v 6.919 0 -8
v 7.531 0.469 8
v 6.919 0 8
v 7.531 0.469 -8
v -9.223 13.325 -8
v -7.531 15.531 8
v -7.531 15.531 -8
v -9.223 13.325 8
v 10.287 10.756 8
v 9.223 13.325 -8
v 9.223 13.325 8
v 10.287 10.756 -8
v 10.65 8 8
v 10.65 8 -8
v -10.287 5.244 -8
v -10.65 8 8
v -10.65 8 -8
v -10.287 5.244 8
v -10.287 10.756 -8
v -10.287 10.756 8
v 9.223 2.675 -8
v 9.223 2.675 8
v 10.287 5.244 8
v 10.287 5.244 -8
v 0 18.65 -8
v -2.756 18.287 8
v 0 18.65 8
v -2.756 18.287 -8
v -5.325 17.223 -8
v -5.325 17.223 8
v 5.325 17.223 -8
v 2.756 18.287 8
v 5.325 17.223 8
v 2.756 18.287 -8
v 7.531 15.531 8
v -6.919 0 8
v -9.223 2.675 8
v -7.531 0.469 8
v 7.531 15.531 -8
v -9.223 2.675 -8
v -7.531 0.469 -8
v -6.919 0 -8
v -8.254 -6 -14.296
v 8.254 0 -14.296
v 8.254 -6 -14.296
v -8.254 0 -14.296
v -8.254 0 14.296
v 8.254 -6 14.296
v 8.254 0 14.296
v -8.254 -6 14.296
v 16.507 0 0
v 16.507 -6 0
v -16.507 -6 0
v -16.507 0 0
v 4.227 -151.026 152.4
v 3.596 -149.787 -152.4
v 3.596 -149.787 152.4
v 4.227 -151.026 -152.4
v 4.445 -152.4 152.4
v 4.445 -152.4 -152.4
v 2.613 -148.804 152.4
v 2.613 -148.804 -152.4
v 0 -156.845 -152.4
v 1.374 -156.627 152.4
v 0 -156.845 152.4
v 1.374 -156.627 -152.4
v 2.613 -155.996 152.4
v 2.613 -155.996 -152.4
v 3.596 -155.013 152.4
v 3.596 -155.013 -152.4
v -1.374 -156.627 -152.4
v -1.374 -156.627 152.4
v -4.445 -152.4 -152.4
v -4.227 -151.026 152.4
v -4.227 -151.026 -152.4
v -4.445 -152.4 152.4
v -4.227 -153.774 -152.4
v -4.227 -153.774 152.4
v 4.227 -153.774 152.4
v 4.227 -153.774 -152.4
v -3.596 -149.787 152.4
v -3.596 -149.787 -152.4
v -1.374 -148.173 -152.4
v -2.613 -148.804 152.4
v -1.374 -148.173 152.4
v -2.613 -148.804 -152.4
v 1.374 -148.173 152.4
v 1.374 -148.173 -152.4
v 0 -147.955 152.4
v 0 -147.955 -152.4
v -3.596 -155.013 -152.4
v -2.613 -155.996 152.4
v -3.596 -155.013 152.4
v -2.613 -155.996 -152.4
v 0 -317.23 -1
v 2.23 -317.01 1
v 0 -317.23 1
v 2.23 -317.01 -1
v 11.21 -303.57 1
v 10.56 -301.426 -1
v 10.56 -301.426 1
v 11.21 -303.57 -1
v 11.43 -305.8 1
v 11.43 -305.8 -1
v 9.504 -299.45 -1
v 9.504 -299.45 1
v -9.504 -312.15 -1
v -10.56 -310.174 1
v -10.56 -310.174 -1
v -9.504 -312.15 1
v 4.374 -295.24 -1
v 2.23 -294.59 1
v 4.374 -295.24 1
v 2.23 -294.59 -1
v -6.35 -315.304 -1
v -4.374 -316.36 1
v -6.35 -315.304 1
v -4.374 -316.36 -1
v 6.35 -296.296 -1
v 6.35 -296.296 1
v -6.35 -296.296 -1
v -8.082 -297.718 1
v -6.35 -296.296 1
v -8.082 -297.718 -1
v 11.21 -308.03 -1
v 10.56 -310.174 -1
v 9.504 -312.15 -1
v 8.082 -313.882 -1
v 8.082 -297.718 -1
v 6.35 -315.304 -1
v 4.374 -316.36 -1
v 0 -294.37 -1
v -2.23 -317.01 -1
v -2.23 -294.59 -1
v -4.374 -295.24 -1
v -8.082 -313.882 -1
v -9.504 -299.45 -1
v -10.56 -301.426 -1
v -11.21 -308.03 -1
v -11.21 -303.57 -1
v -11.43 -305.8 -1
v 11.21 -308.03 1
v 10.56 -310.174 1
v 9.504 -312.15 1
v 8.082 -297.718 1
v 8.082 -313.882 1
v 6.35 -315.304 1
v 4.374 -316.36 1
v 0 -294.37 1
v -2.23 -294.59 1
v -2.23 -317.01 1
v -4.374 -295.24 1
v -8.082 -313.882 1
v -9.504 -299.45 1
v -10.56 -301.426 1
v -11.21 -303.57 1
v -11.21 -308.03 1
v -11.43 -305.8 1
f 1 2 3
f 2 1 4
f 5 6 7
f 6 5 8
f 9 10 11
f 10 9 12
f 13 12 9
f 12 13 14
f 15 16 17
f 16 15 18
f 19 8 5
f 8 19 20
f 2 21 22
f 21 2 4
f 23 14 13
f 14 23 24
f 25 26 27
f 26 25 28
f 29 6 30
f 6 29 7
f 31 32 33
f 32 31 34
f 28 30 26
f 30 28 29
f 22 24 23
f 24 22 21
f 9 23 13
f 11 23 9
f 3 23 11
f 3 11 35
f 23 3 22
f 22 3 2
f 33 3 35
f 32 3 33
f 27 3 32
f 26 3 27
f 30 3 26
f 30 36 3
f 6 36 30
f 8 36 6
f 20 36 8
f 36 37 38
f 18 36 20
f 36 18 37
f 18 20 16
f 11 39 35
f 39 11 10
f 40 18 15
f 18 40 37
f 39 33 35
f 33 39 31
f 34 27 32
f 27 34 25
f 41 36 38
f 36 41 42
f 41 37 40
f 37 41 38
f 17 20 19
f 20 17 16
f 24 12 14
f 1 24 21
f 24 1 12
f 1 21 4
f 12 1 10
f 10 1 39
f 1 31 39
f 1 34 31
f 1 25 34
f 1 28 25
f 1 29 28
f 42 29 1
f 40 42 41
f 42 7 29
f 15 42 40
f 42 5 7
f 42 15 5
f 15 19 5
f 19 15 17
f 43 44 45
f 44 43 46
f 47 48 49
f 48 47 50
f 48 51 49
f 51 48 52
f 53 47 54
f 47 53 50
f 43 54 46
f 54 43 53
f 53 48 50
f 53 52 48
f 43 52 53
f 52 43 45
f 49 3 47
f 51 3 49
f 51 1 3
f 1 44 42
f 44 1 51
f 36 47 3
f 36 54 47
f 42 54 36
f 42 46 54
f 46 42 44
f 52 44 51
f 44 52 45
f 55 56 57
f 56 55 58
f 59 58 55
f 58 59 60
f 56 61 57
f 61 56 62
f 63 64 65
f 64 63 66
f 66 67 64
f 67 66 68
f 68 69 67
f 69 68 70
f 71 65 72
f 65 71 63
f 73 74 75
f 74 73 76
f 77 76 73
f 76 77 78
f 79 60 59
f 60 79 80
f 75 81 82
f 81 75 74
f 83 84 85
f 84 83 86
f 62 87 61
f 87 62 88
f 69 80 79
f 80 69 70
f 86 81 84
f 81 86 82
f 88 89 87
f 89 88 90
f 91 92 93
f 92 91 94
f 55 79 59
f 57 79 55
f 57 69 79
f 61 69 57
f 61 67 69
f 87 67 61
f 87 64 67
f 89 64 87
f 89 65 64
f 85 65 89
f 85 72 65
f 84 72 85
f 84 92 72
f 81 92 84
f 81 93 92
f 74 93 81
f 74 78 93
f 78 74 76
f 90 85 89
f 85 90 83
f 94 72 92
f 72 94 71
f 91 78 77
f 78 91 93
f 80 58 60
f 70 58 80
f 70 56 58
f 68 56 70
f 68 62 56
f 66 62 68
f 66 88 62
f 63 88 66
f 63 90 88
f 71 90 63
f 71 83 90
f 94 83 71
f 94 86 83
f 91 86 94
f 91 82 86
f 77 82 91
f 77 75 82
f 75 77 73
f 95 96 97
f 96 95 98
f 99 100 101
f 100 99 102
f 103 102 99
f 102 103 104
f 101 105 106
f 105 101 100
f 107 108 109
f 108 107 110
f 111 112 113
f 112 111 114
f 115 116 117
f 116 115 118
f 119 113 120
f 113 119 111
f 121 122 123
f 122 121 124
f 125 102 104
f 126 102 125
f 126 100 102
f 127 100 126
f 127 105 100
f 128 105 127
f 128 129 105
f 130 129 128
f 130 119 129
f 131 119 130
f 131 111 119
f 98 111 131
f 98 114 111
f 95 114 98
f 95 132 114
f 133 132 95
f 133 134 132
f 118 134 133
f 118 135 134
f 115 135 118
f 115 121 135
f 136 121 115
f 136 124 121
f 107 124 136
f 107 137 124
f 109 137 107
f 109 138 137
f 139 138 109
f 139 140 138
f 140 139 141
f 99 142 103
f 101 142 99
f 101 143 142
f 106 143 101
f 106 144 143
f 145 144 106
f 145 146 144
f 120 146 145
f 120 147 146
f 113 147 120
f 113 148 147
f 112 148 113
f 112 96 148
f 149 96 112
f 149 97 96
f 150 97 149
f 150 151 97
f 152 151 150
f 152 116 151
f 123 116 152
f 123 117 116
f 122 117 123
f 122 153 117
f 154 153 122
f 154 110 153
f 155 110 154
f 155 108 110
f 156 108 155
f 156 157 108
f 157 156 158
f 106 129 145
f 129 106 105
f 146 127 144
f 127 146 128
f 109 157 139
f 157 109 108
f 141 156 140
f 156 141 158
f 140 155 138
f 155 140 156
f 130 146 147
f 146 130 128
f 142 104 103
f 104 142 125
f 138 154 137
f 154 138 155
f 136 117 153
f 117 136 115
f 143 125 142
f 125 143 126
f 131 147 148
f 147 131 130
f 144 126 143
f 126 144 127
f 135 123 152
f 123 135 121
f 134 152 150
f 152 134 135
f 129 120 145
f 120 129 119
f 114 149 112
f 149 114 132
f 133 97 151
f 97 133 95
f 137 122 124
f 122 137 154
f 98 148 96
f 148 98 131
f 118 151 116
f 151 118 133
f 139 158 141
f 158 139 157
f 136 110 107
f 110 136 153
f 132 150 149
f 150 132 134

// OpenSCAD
// Auto-generated by scripts/author_from_manifest.py (Phase D.3).
// Source: data/phase_d_manifest.json (sku_intent='tyco-ty3596-dry-pendent-200f').
// Do not hand-edit — regenerate from the manifest.
//
// @part tyco_ty3596_dry_pendent_200f
// @kind sprinkler_head
// @category head.pendant.k56
// @display-name "Tyco TY3596 Dry Pendent K5.6 200°F"
// @mfg tyco_fire_protection
// @mfg-pn TY3596
// @listing UL FM
// @hazard-classes LH OH1
// @price-usd 82.00
// @install-minutes 14
// @crew journeyman
// @k-factor 5.6
// @orientation pendant
// @response standard
// @temperature 200F
// @param size_in number default=0.5 label="Size" unit="in"
// @port inlet position=[0,0.014,0] direction=[0,1,0] style=NPT_threaded size_in=0.5 role=drop

size_in = 0.5;
k_factor = 5.6;

length_mm   = 304.80;
body_dia_mm = 25.40;
thread_od   = 21.3;
thread_len  = 16;
deflector_d = body_dia_mm * 0.9;

 union() {
    translate([0, thread_len/2, 0])
        cylinder(h = thread_len, d = thread_od, center = true, $fn = 24);
    translate([0, -3, 0])
        rotate([90, 0, 0])
        cylinder(h = 6, d = thread_od * 1.55, $fn = 6, center = true);
    translate([0, -length_mm/2, 0])
        cylinder(h = length_mm, d = body_dia_mm * 0.35, center = true, $fn = 20);
    translate([0, -length_mm - 1, 0])
        cylinder(h = 2, d = deflector_d, center = true, $fn = 32);
}
